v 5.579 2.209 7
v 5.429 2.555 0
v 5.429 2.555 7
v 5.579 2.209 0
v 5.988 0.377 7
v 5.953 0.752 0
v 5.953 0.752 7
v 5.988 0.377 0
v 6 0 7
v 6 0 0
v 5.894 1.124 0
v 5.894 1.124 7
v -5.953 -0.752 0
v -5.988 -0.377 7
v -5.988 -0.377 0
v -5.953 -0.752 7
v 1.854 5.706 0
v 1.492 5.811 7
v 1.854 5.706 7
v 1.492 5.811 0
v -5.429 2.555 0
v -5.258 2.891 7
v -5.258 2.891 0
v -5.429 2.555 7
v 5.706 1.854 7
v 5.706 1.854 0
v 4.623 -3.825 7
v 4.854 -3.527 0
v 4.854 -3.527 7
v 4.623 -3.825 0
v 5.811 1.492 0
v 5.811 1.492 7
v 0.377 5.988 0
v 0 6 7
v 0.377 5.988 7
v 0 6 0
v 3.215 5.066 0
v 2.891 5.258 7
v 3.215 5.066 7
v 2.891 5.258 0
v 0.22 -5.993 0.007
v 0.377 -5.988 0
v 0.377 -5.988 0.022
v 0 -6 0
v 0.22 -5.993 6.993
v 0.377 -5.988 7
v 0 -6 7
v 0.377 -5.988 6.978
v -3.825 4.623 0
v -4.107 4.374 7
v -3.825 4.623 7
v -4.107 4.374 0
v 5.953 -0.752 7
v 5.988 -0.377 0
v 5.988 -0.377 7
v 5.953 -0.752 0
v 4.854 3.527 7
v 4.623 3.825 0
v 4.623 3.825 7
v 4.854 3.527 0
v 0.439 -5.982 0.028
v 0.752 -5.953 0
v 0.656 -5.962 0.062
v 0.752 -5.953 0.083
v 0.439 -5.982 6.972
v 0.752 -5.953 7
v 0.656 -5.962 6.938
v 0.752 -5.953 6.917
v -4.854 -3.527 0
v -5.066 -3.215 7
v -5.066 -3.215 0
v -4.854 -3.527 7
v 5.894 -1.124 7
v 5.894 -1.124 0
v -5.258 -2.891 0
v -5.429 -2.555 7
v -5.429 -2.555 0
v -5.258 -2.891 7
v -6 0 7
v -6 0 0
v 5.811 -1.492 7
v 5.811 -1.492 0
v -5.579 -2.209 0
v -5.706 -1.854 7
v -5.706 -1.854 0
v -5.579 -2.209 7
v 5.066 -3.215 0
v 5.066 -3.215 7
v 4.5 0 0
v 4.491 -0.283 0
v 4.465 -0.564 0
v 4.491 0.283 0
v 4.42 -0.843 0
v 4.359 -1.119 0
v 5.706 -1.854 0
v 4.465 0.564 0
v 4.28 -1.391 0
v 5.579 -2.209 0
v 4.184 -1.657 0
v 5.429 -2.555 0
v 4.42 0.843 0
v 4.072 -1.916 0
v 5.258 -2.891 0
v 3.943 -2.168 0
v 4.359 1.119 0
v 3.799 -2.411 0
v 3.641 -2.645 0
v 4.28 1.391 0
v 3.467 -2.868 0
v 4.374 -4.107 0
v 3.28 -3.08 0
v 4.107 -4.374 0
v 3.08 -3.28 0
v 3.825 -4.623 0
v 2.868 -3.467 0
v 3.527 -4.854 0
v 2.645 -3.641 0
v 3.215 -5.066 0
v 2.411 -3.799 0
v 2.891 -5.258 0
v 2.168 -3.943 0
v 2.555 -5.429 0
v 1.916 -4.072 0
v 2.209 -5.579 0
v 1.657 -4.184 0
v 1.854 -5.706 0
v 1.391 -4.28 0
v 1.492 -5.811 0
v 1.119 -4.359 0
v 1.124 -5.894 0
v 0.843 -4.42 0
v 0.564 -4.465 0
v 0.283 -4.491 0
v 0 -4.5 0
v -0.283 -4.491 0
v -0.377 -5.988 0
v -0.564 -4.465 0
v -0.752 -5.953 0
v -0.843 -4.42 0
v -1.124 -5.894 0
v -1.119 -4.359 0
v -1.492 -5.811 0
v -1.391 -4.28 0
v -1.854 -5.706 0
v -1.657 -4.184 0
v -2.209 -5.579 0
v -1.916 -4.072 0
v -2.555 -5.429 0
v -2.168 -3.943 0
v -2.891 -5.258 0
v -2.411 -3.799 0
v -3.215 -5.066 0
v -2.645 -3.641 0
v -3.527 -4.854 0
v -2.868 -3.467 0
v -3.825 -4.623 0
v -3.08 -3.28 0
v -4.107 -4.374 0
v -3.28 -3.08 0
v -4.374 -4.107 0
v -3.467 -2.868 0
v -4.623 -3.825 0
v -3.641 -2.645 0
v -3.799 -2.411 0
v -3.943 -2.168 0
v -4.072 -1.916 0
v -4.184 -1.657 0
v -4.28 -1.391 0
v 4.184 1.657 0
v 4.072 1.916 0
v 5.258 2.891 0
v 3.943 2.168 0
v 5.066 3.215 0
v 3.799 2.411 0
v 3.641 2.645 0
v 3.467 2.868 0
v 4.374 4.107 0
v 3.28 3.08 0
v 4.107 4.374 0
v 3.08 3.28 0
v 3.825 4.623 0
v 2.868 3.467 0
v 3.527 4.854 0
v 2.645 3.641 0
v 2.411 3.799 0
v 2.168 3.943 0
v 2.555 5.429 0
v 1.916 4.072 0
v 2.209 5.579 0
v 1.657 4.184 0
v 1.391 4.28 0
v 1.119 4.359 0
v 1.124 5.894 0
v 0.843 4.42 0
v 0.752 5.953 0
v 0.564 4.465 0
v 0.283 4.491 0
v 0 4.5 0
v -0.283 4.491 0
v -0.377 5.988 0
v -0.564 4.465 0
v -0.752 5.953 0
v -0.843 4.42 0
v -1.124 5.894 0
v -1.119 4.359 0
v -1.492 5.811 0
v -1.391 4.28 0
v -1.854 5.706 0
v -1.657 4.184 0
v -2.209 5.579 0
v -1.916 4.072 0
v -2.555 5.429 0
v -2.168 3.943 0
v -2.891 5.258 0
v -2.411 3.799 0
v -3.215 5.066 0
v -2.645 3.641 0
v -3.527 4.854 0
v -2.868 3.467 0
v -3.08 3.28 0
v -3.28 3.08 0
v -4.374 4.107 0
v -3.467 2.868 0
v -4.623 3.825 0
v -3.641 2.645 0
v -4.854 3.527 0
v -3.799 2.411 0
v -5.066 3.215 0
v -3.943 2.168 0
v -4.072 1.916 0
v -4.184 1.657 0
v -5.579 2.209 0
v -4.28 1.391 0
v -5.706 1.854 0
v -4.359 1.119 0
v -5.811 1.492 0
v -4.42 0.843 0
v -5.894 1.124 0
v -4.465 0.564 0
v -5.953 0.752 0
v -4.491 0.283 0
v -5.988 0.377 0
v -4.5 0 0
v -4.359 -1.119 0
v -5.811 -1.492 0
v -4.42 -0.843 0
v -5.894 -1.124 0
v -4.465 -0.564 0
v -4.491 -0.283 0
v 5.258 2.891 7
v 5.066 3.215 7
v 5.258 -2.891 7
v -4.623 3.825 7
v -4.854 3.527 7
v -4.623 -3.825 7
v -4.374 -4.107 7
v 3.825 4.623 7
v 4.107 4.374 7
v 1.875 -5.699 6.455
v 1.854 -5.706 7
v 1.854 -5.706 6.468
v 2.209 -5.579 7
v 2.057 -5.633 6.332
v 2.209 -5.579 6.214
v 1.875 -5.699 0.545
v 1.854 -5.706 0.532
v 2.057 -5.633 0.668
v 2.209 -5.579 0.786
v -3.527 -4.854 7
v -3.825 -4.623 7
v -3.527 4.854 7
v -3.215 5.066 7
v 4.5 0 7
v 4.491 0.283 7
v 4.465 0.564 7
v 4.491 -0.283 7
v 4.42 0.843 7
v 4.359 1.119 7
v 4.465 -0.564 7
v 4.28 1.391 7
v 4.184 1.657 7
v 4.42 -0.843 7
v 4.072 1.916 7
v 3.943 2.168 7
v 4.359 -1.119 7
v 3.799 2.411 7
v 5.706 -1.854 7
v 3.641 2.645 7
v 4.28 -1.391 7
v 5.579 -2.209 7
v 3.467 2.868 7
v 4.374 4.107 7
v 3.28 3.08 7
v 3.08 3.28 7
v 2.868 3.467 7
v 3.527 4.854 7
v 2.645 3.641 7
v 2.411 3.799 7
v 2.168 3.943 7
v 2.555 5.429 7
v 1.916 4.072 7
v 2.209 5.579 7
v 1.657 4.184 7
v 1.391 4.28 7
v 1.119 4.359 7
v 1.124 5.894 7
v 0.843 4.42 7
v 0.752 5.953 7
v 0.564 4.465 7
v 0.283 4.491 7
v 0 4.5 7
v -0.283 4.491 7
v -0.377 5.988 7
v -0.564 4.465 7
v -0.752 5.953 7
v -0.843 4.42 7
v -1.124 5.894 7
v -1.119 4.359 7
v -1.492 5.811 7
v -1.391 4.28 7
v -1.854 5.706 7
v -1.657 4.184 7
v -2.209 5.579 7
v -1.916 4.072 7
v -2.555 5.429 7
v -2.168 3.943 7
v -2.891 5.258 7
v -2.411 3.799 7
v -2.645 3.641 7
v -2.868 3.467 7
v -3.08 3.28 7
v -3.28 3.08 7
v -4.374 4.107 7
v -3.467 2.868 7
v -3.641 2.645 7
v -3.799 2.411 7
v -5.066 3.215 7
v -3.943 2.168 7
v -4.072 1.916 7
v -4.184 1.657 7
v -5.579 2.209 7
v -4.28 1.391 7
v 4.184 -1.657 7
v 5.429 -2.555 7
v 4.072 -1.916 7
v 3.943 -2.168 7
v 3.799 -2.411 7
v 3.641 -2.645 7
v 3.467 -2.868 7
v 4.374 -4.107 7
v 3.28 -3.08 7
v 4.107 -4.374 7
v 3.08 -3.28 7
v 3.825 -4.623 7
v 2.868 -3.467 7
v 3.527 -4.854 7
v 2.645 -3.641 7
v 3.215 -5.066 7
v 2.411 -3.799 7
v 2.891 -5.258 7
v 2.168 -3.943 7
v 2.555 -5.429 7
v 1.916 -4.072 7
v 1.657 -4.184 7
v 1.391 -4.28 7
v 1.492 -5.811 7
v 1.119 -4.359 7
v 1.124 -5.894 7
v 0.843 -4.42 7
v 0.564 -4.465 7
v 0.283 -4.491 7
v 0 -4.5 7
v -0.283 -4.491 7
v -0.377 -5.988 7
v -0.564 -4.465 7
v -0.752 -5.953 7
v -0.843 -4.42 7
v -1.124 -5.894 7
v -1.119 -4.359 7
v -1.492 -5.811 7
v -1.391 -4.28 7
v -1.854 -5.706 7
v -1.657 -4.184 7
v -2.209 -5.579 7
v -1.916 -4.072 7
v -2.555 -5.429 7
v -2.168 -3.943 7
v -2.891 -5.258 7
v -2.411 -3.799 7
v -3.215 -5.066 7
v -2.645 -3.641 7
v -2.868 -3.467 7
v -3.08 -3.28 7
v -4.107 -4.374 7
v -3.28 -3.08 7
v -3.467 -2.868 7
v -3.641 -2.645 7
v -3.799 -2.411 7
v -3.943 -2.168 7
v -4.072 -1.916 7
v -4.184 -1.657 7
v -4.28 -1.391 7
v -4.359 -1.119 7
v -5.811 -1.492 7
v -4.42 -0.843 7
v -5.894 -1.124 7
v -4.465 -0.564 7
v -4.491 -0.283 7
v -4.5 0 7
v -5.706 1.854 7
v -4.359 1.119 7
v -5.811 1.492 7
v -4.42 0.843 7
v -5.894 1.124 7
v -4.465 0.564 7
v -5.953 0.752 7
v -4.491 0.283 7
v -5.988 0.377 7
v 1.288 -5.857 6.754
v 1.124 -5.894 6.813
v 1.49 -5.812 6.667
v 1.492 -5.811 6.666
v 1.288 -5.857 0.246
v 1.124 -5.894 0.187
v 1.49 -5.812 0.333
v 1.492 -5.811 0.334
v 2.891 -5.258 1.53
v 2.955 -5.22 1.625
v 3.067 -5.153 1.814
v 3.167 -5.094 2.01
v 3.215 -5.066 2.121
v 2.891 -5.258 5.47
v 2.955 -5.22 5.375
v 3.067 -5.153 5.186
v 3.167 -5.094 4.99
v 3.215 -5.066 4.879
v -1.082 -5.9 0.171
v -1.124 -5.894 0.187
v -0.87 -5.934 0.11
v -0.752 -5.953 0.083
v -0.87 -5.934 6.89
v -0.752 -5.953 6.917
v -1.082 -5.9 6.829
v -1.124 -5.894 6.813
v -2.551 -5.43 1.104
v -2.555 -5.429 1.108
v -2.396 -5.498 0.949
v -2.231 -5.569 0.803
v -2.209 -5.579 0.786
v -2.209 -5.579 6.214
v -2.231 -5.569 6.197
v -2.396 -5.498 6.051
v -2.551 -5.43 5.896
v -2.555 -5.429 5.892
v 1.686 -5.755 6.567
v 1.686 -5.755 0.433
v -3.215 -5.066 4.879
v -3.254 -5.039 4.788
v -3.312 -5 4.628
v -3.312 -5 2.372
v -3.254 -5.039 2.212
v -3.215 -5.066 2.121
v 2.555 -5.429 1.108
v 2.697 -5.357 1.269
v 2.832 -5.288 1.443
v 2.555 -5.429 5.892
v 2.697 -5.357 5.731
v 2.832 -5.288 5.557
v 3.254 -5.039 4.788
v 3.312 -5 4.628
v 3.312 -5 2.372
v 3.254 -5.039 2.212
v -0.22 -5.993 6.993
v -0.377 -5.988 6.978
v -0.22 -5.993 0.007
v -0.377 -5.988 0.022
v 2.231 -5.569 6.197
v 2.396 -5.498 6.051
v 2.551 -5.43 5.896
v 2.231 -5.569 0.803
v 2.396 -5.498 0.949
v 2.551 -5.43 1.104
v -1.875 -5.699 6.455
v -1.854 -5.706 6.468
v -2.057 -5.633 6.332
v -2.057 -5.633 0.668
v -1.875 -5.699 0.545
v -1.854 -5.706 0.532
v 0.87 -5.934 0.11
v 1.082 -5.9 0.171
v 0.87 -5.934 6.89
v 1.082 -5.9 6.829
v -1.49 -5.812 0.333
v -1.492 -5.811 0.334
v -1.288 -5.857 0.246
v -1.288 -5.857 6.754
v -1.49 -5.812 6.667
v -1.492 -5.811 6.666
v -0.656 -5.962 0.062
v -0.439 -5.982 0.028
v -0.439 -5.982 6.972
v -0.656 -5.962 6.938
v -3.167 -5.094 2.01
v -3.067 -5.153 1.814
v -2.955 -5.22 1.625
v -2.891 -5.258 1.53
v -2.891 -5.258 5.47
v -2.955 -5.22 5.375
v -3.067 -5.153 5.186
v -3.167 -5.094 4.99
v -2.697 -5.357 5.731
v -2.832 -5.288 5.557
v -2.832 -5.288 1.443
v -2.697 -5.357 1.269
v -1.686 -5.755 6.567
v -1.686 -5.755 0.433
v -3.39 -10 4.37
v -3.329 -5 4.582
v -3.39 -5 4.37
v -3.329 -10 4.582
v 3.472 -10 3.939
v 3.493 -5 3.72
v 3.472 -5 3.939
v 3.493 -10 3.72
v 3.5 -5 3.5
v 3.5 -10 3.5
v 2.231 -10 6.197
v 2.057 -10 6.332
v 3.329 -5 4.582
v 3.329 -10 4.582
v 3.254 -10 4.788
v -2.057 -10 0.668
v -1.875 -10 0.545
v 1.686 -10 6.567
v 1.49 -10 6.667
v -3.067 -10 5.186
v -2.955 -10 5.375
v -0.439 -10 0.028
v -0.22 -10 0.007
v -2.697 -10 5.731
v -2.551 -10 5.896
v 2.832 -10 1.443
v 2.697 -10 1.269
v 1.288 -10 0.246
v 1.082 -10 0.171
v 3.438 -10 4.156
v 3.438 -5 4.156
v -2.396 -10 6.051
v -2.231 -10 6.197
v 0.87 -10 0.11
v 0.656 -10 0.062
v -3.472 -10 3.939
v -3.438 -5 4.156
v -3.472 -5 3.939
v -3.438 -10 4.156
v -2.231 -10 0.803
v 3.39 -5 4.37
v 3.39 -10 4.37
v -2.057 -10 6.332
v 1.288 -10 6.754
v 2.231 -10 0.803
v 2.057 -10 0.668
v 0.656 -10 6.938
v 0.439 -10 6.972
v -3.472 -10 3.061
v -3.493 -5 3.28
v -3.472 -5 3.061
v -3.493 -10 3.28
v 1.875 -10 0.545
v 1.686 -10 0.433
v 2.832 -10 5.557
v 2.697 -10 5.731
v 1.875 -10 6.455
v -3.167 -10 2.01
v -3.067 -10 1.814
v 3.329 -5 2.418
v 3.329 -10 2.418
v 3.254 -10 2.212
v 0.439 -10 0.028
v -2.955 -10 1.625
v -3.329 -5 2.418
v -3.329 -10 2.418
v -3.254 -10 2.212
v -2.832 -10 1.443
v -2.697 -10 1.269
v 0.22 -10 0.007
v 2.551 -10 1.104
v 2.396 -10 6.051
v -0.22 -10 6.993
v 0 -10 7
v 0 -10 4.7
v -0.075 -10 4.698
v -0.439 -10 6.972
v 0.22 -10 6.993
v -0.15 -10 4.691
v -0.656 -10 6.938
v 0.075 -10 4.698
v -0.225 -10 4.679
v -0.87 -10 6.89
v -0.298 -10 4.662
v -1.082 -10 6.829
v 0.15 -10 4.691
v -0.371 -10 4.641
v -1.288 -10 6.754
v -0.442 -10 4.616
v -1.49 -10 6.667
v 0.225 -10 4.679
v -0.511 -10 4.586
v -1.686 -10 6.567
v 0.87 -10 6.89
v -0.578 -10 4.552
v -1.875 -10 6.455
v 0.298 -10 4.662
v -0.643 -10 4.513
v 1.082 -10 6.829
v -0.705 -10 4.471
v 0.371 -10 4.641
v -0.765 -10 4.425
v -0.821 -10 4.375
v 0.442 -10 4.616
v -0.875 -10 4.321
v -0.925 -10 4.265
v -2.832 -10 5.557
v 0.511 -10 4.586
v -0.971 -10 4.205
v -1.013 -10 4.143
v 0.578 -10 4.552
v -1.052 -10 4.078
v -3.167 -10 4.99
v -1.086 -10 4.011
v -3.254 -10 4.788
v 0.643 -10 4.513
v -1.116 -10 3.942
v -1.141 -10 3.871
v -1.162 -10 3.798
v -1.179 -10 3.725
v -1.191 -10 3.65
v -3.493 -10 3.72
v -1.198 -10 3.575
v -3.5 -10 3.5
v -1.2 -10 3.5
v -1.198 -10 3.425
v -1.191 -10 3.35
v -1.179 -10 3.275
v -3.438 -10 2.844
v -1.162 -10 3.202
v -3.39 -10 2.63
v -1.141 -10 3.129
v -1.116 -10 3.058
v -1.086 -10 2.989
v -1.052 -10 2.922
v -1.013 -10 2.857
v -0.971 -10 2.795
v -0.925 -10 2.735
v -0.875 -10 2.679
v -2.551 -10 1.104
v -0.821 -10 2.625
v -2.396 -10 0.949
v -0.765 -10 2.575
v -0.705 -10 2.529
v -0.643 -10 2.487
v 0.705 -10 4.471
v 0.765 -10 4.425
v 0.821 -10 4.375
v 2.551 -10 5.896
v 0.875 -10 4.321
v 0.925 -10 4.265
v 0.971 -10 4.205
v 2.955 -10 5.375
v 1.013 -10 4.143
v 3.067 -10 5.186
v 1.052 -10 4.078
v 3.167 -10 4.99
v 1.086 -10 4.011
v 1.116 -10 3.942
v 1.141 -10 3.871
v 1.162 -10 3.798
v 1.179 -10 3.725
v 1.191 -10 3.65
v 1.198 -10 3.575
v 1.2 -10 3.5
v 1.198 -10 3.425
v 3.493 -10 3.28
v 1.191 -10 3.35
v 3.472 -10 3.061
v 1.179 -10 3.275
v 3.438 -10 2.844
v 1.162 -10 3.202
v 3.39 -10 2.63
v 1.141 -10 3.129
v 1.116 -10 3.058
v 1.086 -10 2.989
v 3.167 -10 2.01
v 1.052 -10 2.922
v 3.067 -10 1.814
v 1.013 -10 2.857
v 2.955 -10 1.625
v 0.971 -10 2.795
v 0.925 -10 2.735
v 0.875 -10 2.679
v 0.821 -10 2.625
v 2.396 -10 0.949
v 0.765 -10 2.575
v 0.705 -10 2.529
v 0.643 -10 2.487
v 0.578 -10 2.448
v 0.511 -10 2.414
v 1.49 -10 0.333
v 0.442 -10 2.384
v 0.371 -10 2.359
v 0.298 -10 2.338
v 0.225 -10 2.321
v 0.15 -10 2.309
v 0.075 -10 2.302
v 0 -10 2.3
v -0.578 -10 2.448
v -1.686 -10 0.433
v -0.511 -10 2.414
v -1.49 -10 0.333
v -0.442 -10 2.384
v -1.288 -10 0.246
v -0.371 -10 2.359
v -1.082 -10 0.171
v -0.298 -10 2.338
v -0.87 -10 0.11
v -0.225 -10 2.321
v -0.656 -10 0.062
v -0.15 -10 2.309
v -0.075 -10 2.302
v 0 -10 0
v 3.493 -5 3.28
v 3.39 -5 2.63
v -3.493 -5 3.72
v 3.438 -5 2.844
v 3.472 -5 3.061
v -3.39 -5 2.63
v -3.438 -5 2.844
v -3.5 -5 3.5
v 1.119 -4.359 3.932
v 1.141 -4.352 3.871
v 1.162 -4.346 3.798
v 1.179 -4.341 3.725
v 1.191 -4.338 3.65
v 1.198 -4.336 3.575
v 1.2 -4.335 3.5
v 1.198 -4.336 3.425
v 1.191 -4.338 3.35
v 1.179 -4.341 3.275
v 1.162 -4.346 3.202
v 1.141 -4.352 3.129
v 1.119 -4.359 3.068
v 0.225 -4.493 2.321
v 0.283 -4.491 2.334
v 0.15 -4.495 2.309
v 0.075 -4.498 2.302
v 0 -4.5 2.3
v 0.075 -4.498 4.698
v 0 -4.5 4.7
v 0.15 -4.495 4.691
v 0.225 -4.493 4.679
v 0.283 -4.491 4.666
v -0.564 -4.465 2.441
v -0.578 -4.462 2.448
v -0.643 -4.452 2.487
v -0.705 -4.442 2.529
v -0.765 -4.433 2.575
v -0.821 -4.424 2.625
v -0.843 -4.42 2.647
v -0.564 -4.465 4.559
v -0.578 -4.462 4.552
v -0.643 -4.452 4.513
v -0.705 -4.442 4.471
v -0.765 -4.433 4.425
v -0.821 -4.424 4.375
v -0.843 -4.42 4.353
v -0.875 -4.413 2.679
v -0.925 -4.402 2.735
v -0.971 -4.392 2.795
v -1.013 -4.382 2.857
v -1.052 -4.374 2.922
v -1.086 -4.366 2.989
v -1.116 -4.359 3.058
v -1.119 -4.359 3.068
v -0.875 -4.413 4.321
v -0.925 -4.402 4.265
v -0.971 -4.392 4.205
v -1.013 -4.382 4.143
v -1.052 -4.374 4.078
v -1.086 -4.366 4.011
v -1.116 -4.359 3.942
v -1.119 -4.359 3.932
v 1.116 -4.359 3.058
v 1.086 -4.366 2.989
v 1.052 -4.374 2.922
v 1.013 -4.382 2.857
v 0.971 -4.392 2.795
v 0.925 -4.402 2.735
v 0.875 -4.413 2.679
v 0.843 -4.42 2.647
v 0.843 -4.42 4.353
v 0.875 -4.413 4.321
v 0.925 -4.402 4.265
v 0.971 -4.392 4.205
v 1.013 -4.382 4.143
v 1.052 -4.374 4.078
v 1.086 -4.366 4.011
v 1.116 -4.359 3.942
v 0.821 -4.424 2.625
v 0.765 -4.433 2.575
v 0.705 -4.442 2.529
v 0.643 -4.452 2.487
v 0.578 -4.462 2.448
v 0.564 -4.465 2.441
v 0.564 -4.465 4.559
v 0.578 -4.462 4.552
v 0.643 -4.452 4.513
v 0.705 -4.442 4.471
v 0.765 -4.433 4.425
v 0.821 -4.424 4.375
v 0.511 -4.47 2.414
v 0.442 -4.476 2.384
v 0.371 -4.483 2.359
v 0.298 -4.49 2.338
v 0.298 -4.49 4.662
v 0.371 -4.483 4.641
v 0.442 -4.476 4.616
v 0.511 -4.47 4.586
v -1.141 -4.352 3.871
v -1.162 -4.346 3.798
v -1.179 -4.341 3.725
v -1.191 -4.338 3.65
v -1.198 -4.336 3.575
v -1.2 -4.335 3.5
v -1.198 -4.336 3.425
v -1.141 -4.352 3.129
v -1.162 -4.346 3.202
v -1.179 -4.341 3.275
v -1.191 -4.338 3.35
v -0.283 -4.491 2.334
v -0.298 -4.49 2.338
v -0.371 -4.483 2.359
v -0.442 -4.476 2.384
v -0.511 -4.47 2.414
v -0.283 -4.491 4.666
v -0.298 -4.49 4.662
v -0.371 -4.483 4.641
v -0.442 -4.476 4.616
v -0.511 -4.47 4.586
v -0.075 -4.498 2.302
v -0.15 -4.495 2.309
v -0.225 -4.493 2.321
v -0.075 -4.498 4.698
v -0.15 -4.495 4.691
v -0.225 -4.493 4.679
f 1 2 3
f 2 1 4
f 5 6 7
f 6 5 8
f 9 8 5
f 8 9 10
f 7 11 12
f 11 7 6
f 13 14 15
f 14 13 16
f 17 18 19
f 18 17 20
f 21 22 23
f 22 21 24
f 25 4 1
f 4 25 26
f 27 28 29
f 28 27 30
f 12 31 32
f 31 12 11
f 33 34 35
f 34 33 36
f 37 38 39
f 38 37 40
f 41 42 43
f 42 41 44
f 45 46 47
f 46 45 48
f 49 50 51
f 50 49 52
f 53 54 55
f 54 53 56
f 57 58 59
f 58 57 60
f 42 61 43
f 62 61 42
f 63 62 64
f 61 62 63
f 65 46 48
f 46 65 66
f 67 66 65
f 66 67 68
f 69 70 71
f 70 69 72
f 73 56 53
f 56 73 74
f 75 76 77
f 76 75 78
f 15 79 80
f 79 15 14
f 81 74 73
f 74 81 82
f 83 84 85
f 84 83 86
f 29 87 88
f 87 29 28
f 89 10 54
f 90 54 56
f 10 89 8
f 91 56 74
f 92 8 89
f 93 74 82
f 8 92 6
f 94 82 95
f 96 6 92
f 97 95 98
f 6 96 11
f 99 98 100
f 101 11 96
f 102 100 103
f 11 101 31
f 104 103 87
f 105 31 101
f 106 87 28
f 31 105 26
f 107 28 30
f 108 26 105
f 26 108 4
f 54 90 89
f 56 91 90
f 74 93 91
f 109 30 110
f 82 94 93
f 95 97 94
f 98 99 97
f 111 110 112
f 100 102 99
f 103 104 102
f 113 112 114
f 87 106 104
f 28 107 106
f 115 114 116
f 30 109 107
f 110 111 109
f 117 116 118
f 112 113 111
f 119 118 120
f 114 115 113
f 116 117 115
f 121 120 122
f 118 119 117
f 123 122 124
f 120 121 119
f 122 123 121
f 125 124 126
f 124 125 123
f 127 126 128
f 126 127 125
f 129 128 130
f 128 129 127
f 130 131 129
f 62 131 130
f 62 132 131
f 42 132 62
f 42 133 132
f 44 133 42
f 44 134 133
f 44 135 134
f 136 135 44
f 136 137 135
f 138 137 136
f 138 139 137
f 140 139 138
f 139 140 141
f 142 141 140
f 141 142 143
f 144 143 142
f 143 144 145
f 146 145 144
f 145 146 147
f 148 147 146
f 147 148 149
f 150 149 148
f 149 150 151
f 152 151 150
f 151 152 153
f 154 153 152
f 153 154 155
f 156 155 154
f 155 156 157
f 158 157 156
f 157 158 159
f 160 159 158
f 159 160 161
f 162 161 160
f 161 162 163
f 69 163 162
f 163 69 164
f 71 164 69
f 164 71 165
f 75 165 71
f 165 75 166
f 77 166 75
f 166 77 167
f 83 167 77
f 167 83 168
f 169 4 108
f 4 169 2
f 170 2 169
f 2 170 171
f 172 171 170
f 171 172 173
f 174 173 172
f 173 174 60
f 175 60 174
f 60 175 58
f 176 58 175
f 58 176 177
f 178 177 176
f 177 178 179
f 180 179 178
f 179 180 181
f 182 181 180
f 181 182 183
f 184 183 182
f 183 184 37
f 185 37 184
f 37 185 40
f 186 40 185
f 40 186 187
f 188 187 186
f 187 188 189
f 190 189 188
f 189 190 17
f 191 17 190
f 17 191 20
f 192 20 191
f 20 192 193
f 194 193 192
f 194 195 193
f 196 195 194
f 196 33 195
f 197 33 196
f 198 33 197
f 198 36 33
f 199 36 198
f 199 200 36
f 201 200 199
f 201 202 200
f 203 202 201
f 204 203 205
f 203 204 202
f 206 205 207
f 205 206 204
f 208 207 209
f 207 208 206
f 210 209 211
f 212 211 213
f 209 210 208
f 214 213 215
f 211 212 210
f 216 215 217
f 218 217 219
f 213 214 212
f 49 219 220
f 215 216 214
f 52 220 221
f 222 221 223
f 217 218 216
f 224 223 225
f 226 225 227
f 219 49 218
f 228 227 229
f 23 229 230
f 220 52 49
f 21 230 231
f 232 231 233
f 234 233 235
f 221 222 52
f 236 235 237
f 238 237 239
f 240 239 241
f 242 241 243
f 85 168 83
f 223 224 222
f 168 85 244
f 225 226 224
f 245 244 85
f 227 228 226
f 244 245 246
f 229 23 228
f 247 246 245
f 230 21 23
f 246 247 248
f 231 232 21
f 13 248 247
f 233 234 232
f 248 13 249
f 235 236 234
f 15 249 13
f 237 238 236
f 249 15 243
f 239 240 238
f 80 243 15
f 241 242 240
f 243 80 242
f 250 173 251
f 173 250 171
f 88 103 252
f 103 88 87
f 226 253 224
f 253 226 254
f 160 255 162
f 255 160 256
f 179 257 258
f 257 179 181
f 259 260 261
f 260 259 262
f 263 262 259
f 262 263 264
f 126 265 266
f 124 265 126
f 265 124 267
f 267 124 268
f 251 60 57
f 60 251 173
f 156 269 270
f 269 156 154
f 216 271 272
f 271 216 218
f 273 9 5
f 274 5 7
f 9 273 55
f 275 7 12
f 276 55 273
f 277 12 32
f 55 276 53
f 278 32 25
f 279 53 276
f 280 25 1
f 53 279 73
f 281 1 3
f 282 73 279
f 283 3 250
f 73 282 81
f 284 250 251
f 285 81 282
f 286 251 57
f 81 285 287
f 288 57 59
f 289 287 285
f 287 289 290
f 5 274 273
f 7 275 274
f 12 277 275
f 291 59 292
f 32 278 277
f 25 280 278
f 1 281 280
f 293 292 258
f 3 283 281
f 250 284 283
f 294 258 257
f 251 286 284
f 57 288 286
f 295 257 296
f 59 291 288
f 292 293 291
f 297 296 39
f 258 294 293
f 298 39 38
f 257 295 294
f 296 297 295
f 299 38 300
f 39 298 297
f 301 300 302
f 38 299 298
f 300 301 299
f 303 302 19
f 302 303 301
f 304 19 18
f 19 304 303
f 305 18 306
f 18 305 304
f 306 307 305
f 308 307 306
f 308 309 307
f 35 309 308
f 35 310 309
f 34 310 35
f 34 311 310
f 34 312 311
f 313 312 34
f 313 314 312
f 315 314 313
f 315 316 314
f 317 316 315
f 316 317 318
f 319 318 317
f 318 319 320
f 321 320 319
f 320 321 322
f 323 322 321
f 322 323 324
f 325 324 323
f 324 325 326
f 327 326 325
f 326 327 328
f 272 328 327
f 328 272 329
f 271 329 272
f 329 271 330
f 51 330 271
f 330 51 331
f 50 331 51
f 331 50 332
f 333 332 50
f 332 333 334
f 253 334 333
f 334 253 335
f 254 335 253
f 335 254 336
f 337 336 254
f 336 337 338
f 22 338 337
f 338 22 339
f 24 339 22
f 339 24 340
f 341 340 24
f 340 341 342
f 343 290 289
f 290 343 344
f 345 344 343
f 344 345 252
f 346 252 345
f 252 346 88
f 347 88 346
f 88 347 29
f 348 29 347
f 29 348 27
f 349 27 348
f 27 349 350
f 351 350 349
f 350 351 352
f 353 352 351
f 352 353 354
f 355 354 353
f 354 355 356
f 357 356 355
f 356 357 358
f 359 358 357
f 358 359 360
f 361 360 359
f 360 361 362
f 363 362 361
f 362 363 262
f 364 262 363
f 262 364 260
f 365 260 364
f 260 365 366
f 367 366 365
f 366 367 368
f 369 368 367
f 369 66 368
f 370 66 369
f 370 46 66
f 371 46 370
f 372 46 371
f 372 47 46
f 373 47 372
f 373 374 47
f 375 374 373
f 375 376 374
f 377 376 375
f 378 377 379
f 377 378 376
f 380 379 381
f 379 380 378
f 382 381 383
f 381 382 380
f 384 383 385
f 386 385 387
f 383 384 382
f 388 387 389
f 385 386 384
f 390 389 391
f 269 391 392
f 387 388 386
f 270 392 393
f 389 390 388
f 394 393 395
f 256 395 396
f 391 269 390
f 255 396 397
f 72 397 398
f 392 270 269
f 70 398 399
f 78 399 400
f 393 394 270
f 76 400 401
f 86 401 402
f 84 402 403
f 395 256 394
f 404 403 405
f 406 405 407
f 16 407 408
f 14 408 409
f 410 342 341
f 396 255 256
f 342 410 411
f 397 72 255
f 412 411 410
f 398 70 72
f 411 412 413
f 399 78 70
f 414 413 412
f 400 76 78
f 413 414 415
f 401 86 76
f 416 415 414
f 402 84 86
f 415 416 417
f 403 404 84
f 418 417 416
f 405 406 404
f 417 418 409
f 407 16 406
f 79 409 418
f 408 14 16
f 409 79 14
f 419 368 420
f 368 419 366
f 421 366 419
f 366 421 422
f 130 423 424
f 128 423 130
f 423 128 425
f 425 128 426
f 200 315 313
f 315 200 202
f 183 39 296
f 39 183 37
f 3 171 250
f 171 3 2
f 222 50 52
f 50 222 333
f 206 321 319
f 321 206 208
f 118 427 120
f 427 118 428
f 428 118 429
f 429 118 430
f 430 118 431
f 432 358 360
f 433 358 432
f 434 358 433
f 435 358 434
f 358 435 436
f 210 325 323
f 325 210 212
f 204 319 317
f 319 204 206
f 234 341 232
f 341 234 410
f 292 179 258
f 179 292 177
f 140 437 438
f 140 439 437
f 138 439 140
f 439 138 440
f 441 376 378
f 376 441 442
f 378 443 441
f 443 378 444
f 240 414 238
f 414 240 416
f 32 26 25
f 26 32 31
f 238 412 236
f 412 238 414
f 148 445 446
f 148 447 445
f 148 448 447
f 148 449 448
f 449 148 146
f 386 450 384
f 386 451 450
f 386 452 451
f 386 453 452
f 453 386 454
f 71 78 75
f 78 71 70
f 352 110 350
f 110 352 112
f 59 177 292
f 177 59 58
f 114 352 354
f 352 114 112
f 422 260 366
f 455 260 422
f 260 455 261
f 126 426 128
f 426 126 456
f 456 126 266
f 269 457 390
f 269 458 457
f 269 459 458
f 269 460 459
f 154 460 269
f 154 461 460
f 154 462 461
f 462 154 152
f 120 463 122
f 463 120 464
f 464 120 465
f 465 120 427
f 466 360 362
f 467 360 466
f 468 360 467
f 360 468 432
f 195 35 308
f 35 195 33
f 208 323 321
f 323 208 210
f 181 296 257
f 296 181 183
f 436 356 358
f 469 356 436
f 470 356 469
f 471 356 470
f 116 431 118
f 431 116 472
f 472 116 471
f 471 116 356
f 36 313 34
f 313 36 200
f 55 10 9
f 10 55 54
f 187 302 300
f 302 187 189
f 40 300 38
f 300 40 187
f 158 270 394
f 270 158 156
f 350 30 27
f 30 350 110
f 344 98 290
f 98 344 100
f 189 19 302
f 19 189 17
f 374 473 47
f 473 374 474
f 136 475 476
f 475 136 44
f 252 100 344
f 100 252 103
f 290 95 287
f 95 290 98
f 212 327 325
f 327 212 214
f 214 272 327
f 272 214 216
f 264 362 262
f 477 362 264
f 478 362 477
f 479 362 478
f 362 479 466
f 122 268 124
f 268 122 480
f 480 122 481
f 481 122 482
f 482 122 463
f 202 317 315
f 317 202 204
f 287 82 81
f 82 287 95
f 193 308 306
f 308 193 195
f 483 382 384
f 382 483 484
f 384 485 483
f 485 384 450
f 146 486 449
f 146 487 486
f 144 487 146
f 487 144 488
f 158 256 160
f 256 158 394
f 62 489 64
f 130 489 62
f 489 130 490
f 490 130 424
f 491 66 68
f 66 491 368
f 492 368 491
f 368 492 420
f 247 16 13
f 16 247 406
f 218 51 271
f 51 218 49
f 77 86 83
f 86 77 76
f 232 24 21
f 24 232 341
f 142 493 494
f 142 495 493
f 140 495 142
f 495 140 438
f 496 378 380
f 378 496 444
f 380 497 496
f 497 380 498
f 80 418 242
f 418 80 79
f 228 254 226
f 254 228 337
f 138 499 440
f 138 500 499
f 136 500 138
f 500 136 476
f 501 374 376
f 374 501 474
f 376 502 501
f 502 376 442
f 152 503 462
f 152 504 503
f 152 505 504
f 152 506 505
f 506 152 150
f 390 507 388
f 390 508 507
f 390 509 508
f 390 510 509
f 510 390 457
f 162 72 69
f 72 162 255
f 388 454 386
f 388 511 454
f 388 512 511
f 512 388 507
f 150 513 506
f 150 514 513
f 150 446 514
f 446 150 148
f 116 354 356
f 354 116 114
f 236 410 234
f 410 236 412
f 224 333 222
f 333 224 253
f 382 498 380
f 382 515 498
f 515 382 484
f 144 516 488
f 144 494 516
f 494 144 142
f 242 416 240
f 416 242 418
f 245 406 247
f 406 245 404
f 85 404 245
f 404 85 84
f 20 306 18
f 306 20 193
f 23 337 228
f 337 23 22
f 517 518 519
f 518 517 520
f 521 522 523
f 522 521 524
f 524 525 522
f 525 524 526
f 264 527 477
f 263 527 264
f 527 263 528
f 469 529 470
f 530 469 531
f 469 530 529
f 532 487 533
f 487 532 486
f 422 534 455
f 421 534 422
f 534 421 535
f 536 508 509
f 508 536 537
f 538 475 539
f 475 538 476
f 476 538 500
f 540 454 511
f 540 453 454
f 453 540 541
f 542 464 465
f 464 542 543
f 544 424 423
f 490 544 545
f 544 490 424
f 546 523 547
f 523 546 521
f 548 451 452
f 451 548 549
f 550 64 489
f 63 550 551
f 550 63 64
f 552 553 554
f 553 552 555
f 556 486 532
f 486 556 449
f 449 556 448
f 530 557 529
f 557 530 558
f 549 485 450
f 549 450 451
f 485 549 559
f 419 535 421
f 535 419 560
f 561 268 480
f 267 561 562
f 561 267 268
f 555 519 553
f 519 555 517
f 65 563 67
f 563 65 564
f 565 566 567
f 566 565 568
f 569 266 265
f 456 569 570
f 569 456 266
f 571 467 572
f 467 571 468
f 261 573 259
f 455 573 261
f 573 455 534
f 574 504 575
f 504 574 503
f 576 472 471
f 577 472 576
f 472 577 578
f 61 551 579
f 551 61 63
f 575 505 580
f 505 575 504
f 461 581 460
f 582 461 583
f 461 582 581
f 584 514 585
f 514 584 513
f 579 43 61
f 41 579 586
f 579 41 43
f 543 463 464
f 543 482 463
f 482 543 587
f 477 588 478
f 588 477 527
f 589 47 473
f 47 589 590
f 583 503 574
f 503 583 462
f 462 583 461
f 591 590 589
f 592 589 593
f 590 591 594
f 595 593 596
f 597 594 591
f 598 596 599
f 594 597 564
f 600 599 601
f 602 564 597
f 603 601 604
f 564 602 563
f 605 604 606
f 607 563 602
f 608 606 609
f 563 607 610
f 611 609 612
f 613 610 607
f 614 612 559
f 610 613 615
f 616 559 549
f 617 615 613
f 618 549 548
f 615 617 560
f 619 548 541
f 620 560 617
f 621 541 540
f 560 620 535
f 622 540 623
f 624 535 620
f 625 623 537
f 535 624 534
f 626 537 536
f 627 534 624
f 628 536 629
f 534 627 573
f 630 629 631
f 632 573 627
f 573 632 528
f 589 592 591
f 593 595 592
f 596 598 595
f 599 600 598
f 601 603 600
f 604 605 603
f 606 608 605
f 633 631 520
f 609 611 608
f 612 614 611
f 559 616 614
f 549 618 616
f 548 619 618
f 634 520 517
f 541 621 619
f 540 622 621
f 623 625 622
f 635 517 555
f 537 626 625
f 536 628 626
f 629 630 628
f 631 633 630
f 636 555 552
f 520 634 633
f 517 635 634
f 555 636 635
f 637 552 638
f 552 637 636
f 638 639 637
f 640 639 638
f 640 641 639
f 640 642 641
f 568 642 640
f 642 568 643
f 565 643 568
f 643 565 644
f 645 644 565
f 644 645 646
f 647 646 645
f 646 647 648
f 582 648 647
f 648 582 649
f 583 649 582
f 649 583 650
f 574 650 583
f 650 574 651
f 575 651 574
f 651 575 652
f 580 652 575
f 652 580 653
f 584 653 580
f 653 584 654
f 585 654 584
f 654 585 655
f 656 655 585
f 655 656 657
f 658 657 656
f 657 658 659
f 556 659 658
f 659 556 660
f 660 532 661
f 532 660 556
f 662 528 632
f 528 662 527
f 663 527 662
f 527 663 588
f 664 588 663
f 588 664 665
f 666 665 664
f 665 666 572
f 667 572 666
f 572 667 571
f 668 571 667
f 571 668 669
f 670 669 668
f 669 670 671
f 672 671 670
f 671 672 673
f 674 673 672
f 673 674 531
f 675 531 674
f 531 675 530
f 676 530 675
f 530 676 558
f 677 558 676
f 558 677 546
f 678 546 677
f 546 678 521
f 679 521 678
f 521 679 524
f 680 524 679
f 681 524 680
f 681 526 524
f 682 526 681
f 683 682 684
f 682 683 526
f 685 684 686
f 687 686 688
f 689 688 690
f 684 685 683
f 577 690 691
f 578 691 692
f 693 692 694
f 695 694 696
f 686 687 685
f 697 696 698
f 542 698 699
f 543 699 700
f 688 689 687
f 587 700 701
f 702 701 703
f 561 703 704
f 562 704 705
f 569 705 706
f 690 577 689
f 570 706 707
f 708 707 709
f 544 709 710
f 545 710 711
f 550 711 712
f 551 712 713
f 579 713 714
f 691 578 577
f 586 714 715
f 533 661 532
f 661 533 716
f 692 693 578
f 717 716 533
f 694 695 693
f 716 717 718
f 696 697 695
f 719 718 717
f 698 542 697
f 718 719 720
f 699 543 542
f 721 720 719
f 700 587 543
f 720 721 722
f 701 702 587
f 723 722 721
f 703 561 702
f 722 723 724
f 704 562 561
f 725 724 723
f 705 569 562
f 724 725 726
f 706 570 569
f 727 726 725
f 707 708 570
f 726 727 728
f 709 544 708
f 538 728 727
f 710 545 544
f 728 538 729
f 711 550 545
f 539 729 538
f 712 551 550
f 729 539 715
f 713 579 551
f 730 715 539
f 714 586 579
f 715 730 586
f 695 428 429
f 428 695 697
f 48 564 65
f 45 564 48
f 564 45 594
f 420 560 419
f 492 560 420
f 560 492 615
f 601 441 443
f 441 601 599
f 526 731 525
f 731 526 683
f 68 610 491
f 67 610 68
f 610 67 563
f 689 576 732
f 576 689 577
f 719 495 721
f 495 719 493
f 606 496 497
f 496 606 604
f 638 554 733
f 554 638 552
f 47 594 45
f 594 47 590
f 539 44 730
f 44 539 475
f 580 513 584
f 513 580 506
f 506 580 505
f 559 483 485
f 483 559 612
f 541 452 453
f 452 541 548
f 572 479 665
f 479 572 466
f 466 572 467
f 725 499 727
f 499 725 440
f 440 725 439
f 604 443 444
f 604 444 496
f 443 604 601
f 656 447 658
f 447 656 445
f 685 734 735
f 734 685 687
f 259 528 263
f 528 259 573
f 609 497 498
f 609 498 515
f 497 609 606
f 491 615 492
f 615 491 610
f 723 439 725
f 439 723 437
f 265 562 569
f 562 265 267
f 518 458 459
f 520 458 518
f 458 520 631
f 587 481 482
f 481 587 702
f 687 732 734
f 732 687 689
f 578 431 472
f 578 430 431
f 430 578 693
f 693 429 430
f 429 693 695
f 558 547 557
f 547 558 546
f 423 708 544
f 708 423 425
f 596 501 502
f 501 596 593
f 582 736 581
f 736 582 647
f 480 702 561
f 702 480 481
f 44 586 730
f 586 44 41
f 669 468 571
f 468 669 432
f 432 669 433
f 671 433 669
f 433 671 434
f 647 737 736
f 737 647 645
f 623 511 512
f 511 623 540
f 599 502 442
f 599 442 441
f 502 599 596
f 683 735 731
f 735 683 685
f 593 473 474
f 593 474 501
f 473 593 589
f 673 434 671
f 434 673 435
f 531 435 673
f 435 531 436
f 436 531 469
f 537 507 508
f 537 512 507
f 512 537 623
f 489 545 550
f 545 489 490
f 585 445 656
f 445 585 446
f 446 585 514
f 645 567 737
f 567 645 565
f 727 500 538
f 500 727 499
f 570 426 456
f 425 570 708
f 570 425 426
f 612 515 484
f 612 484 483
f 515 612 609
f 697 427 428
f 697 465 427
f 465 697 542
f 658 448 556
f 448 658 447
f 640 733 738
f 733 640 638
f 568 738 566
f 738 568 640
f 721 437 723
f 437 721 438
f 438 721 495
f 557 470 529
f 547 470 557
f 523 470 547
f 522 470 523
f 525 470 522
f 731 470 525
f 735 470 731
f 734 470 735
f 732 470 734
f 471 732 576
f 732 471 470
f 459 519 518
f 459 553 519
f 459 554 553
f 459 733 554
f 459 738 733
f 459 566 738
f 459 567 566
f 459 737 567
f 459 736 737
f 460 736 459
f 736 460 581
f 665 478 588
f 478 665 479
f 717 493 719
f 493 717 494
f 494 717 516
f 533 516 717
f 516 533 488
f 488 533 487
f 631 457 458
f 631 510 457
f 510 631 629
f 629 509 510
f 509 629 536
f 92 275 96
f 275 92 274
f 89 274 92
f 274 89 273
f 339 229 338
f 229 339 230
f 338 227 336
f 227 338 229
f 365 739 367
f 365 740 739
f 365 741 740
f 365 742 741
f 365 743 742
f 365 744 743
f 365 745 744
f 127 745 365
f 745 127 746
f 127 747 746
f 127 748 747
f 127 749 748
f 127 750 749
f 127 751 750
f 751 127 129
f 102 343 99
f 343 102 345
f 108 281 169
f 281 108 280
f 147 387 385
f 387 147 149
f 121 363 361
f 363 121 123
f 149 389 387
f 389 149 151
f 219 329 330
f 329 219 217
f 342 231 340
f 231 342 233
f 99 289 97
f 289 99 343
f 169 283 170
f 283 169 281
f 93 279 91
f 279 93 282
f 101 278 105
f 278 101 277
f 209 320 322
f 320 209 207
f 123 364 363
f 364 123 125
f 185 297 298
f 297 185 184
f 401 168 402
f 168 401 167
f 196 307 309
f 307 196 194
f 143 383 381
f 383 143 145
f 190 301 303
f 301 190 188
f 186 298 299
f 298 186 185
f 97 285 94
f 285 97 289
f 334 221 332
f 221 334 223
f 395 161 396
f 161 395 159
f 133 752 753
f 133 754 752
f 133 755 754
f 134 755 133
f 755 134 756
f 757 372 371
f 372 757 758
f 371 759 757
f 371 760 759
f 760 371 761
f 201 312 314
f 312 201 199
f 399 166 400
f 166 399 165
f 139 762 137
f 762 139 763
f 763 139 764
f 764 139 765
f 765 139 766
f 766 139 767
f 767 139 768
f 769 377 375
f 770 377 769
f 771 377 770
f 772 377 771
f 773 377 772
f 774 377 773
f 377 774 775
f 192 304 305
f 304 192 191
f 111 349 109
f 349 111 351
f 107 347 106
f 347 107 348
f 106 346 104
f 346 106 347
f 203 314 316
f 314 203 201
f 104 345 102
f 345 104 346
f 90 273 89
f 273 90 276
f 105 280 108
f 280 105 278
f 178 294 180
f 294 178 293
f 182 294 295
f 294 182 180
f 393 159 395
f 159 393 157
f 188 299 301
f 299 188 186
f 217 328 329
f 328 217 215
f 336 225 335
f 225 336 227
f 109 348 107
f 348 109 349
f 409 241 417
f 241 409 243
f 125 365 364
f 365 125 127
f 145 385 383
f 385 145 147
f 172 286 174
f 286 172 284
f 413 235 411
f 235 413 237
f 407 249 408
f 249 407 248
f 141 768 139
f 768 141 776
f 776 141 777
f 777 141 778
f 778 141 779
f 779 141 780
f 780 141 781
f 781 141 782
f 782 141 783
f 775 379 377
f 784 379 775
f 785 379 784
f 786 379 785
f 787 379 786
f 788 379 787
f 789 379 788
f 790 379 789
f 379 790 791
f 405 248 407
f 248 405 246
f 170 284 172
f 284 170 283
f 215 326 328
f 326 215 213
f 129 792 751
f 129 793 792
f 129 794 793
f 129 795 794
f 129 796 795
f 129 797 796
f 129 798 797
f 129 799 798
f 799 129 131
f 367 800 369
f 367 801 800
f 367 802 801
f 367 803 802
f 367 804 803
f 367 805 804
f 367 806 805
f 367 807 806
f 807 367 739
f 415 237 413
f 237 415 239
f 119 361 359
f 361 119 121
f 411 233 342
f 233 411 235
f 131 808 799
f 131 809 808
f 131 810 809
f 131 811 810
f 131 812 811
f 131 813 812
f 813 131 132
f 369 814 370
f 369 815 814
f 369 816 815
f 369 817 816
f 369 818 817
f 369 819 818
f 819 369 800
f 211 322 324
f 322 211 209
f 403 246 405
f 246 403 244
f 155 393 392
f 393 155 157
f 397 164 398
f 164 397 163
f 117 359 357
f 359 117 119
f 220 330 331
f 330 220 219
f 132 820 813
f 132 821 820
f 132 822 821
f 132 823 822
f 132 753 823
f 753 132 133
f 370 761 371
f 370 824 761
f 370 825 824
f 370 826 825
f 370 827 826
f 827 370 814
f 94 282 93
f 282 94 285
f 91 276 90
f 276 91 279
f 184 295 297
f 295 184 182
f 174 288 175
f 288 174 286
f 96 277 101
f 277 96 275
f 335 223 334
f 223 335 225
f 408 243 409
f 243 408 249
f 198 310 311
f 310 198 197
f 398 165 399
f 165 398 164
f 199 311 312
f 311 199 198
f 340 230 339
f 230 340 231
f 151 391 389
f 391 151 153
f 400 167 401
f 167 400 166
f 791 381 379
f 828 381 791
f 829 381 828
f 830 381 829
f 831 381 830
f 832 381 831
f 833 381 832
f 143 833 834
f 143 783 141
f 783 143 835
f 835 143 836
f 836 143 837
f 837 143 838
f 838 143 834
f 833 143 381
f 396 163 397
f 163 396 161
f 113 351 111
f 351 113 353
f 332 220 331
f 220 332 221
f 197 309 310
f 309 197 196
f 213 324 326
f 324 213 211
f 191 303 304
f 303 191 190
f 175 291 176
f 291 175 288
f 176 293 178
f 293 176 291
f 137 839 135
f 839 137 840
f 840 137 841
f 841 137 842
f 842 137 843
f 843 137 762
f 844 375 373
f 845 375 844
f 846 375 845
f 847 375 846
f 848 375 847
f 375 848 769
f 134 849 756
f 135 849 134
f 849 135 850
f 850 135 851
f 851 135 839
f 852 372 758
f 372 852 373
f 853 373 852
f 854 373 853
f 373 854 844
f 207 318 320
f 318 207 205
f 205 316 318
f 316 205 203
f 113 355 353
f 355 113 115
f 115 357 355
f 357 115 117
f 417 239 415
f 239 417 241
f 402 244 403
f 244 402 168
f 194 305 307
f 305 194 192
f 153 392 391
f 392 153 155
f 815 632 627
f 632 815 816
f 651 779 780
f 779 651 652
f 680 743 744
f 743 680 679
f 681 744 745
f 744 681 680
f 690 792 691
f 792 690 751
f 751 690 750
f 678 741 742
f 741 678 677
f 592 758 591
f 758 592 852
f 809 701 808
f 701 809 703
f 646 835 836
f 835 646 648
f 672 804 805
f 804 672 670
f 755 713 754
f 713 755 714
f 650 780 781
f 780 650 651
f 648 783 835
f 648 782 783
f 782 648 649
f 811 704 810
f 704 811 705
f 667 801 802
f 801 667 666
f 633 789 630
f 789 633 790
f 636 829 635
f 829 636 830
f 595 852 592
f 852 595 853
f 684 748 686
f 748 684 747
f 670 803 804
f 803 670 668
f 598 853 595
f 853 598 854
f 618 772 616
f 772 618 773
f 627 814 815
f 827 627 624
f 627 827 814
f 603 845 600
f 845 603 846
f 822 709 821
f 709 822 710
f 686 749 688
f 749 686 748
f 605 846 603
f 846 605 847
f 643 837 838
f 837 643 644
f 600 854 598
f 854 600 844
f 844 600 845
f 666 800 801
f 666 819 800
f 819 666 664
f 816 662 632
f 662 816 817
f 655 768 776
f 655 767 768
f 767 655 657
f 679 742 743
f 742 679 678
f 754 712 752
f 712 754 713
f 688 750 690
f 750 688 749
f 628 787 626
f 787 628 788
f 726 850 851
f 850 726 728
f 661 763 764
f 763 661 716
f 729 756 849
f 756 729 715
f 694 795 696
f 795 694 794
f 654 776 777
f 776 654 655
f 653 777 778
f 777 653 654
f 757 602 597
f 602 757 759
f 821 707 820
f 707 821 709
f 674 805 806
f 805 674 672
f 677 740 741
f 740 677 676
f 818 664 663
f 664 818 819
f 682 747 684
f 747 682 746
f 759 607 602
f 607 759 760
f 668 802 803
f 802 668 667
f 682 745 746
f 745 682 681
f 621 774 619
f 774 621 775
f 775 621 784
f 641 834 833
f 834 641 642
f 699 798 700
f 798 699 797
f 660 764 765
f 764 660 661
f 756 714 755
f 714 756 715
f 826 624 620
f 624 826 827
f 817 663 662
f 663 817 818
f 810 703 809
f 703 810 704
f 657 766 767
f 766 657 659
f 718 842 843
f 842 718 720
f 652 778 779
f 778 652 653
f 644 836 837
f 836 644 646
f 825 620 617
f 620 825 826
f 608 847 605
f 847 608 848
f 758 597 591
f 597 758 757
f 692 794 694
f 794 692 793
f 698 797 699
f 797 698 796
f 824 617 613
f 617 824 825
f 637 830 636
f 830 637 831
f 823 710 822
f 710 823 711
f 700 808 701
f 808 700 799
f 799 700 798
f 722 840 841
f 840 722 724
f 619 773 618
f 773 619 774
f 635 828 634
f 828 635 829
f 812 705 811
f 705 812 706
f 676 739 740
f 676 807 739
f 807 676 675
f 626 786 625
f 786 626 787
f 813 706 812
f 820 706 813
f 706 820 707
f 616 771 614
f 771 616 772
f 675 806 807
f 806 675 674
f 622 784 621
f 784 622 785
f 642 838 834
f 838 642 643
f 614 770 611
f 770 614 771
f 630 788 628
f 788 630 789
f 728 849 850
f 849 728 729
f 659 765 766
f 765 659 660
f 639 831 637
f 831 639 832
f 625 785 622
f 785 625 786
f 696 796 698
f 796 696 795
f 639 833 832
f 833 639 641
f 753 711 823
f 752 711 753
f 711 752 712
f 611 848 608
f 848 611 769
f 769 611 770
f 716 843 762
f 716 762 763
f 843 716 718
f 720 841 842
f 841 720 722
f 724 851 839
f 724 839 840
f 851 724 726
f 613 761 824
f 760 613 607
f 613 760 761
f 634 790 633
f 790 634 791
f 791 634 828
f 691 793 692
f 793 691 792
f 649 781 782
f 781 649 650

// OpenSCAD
difference(){
	union(){
        cylinder(h=7, r=6, $fn=100, center=false);
        translate([0,-5,3.5]){
            rotate([90,0,0]){
                cylinder(h=5, r=3.5, $fn=100, center=false);
            }
        }
    }
    union() {
        translate([0,0,-1]){
            rotate([0,0,0]){
                cylinder(h=28, r=4.5, $fn=100, center=false);
            }
        }
        translate([0,0,3.5]){
            rotate([90,0,0]){
                cylinder(h=28, r=1.2, $fn=100, center=false);
            }
        }
    }


}
